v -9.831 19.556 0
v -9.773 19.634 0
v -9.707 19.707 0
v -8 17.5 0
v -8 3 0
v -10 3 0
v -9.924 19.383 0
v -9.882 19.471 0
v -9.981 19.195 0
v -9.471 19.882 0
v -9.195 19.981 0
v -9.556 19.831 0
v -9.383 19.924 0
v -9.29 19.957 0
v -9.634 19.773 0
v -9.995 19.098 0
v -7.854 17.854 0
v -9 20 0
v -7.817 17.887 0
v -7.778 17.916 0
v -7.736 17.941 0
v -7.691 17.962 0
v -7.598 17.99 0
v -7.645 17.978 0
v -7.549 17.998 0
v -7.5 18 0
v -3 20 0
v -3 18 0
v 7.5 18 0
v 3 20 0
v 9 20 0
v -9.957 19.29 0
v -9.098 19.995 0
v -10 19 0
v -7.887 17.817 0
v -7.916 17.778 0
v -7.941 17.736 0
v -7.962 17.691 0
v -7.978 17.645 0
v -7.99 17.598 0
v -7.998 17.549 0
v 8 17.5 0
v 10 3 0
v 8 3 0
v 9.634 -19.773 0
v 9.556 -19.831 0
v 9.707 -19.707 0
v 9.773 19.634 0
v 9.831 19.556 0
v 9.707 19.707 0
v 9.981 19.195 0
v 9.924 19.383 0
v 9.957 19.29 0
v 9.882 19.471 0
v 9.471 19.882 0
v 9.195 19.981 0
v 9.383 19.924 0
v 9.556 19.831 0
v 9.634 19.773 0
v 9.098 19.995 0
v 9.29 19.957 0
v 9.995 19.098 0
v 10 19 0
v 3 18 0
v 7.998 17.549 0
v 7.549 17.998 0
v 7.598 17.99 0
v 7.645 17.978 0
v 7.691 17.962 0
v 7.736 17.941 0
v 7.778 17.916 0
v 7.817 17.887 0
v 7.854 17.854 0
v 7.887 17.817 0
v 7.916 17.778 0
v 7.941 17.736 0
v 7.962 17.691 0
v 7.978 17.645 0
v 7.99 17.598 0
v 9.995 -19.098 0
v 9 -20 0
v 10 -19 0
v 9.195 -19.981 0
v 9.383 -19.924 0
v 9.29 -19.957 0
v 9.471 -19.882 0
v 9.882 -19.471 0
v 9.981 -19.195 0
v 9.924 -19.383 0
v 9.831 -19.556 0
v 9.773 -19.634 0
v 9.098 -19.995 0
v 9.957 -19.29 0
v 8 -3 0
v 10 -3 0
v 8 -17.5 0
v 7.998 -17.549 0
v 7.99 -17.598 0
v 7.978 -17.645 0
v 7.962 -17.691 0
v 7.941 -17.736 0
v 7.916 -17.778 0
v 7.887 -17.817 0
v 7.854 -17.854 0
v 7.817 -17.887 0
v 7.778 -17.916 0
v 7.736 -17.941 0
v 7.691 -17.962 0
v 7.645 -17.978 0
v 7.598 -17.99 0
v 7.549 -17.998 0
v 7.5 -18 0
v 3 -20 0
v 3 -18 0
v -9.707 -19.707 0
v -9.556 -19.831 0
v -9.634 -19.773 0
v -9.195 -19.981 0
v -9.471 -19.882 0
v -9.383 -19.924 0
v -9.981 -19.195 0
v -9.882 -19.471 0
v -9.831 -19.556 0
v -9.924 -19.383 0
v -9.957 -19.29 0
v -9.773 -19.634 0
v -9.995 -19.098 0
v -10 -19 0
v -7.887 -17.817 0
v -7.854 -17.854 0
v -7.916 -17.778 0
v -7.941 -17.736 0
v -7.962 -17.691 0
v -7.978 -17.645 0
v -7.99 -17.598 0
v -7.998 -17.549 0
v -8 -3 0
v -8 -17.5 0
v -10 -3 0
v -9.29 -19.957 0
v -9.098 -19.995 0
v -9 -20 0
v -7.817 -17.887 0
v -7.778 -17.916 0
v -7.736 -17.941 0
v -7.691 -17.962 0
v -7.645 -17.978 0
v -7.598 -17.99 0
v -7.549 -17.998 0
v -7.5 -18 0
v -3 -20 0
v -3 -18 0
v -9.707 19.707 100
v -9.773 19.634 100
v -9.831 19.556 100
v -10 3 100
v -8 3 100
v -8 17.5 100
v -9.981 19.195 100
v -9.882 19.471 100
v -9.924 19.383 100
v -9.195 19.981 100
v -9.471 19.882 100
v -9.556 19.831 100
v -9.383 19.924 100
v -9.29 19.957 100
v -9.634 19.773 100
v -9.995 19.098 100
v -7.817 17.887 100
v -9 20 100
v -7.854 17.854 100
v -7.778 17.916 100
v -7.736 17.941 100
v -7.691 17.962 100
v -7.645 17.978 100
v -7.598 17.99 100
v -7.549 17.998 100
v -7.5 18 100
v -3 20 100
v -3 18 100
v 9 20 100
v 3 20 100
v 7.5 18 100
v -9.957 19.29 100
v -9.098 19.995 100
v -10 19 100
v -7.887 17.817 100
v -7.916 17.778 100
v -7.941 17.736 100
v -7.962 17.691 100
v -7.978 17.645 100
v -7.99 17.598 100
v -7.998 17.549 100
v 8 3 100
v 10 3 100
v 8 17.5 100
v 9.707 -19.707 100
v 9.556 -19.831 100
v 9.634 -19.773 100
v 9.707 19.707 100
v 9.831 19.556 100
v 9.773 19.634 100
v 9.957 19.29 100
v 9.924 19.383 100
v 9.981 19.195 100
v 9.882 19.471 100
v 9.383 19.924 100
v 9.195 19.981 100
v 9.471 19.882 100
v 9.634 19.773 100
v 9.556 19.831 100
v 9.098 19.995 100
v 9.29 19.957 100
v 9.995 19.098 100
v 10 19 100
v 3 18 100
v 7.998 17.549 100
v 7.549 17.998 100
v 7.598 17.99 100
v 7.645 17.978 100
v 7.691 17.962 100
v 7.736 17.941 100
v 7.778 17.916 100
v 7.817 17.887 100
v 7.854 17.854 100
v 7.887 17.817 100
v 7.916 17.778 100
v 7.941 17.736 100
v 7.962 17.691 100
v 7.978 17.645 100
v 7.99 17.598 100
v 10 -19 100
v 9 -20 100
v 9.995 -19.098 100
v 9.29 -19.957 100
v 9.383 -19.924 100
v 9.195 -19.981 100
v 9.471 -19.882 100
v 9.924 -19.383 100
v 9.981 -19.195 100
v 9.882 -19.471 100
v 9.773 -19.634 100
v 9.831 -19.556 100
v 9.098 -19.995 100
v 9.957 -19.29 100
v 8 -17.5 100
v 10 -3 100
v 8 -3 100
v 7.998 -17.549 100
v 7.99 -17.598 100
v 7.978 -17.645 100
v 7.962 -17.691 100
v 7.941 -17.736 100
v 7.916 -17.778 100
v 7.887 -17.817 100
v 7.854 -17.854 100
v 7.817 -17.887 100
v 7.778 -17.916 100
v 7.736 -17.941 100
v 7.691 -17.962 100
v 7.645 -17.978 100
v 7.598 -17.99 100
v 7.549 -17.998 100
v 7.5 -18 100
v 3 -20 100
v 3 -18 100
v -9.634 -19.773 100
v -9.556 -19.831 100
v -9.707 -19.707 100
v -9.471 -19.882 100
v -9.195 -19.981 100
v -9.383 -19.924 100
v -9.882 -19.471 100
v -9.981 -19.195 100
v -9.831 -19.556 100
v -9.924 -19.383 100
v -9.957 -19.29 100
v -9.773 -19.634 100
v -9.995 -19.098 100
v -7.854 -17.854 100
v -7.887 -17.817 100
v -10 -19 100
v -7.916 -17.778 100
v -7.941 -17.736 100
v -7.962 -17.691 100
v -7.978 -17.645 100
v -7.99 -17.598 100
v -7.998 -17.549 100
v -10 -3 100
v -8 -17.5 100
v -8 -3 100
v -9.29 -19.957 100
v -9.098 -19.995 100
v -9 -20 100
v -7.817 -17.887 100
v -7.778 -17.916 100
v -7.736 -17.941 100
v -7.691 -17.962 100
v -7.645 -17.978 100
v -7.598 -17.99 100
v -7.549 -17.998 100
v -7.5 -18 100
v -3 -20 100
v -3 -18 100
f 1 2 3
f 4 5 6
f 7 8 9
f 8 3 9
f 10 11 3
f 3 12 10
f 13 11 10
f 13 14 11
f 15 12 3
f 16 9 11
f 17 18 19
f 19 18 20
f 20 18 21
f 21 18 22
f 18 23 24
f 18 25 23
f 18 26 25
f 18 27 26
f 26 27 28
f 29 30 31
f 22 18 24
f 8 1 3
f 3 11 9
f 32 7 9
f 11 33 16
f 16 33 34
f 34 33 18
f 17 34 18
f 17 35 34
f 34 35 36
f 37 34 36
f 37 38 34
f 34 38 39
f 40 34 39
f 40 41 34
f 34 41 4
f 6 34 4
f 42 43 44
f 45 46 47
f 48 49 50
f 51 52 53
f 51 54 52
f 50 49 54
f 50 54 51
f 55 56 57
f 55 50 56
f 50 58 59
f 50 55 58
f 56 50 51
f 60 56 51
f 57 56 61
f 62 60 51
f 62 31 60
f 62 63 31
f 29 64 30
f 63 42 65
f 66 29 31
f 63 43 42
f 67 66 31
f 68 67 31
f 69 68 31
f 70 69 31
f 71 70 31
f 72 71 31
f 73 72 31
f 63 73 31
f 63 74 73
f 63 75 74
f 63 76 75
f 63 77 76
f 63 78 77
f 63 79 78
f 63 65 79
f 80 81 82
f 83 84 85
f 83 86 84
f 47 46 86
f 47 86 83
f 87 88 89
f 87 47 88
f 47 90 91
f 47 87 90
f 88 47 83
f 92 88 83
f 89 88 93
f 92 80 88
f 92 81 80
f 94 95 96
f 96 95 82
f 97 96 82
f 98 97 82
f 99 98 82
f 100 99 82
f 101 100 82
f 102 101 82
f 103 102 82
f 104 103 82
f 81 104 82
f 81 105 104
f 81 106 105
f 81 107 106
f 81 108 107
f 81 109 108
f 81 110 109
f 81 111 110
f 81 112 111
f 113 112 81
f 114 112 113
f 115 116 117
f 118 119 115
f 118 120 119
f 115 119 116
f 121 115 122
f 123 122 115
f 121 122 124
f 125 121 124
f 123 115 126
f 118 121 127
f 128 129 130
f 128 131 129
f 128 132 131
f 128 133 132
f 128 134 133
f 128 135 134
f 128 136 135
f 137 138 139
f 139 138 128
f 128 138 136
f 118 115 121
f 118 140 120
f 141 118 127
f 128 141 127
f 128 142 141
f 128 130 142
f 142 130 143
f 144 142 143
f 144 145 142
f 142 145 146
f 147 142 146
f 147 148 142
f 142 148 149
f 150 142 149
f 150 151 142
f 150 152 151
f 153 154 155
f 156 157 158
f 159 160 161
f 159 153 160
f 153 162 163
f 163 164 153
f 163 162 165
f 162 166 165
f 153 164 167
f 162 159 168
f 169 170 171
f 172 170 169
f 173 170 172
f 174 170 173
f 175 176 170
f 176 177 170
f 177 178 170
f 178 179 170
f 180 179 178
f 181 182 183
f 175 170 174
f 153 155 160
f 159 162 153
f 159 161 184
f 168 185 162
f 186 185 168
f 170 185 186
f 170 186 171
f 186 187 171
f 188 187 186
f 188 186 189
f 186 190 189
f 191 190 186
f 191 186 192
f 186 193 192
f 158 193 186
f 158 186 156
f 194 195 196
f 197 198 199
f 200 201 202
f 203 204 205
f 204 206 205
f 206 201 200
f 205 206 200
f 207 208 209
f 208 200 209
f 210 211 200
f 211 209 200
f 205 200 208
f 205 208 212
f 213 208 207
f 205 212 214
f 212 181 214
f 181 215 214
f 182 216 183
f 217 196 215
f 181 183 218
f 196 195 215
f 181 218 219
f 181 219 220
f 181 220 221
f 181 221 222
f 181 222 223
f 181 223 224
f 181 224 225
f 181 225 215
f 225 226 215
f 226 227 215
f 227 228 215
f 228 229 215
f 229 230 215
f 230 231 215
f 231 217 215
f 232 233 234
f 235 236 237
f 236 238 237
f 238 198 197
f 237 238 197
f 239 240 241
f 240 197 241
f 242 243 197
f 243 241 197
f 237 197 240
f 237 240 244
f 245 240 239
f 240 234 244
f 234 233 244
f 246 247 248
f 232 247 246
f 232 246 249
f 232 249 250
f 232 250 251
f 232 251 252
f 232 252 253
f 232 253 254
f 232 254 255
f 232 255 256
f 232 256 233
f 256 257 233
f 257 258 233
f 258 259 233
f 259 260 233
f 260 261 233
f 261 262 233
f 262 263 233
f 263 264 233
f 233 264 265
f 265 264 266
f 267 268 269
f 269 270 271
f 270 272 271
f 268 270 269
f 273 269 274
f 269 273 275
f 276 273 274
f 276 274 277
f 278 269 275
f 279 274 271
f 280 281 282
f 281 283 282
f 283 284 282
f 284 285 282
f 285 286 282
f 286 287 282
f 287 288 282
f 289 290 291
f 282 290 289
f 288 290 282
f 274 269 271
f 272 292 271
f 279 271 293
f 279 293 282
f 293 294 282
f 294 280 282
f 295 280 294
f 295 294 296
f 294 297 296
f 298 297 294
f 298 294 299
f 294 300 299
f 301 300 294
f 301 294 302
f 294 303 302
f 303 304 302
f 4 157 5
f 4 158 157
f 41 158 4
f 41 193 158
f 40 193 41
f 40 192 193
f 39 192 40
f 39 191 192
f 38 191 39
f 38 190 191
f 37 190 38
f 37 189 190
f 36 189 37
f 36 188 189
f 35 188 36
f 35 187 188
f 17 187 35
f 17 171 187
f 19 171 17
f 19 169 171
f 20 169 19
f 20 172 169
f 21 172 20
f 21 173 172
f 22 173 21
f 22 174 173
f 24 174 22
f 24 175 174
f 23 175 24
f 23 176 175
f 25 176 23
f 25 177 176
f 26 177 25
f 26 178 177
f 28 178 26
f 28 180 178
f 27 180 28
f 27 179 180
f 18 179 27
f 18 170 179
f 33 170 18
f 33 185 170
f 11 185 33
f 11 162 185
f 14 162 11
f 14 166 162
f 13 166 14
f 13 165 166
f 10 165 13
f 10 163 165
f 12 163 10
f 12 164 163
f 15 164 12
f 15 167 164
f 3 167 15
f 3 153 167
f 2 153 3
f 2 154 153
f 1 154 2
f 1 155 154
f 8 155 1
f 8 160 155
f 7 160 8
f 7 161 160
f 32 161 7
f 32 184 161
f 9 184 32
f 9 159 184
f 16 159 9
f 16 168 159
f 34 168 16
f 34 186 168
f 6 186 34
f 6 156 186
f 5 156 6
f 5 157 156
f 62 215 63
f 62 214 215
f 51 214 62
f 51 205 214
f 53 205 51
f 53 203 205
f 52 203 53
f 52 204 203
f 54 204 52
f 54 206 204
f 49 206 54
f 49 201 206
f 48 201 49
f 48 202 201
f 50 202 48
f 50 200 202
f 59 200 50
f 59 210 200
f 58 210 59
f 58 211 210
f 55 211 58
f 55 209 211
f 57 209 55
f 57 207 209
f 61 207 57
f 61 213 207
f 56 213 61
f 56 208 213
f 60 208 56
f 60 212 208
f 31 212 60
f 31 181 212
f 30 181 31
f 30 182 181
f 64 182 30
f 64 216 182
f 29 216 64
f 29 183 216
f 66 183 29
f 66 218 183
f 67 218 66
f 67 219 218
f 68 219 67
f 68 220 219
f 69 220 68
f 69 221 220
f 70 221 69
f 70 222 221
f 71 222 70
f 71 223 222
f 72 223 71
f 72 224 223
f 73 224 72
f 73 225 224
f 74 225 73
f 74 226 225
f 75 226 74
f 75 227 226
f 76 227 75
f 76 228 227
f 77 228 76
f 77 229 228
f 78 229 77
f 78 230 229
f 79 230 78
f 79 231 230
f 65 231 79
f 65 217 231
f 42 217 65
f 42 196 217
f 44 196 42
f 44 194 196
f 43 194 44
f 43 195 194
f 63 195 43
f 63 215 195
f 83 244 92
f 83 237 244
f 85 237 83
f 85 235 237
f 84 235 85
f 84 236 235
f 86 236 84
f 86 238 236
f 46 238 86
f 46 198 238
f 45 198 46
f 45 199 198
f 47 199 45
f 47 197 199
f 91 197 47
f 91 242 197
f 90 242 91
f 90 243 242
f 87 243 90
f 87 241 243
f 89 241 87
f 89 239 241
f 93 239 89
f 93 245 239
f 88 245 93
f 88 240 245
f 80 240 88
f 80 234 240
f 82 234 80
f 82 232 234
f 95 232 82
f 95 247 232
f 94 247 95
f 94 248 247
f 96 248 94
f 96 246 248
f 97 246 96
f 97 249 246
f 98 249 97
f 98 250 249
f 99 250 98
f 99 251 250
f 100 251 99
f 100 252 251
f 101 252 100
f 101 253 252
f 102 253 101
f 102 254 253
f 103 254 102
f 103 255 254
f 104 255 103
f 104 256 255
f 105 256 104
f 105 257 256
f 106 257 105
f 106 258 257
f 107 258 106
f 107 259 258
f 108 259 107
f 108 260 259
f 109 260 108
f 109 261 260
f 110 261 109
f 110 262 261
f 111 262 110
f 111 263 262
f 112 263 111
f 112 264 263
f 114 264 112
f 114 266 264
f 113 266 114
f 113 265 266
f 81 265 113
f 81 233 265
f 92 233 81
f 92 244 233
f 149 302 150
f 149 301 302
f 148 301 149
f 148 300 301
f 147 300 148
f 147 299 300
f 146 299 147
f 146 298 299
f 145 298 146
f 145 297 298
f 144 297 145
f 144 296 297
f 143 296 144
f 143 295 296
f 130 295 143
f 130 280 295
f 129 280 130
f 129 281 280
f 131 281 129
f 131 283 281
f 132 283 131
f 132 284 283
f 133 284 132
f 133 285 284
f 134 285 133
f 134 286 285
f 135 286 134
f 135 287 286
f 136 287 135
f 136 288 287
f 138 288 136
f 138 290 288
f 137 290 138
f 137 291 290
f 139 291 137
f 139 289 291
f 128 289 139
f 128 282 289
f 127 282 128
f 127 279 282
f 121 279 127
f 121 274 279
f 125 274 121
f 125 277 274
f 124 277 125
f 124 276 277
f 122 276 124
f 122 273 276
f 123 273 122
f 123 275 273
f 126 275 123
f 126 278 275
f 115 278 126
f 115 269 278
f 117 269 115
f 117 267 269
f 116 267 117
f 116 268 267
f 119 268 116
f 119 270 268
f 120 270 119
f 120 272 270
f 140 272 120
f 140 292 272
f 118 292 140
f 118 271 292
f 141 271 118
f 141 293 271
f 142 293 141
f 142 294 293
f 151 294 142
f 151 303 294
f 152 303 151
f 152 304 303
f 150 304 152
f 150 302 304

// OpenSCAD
$fn = 64;

// 20x40 aluminum extrusion-like profile (simplified), 100mm long
// Cross-section: 20mm x 40mm with central bore and four T-slots (approximate)

length = 100;

w = 20;
h = 40;

// Outer corner radius (approx)
r_outer = 1.0;

// Wall thickness (approx)
wall = 2.0;

// Central bore (approx)
bore_d = 5.2;

// Slot parameters (approx)
slot_open = 6.0;     // opening at the face
slot_neck = 3.2;     // narrow neck
slot_depth = 6.5;    // depth from face inward
slot_head_w = 10.0;  // wider internal cavity
slot_head_d = 3.0;   // additional depth for head cavity

module rounded_rect_2d(w, h, r) {
    r2 = min(r, min(w, h)/2);
    hull() {
        translate([ w/2 - r2,  h/2 - r2]) circle(r2);
        translate([-w/2 + r2,  h/2 - r2]) circle(r2);
        translate([-w/2 + r2, -h/2 + r2]) circle(r2);
        translate([ w/2 - r2, -h/2 + r2]) circle(r2);
    }
}

module tslot_cut_2d(face_w, face_h, along_x=true) {
    // Creates a T-slot cut from a face inward.
    // along_x=true means slot opens on +/-X faces; otherwise on +/-Y faces.
    // The slot is centered on the face.
    // Constructed as union of a tapered neck and a wider head cavity.
    if (along_x) {
        // Slot opens on +X face; caller can mirror for -X
        translate([face_w/2 - slot_depth/2, 0])
            square([slot_depth, slot_open], center=true);

        // Neck (narrower) slightly deeper
        translate([face_w/2 - (slot_depth + slot_head_d)/2, 0])
            square([slot_depth + slot_head_d, slot_neck], center=true);

        // Head cavity (wider) deeper inside
        translate([face_w/2 - (slot_depth + slot_head_d) + slot_head_d/2 - 0.01, 0])
            square([slot_head_d + 0.02, slot_head_w], center=true);
    } else {
        // Slot opens on +Y face; caller can mirror for -Y
        translate([0, face_h/2 - slot_depth/2])
            square([slot_open, slot_depth], center=true);

        translate([0, face_h/2 - (slot_depth + slot_head_d)/2])
            square([slot_neck, slot_depth + slot_head_d], center=true);

        translate([0, face_h/2 - (slot_depth + slot_head_d) + slot_head_d/2 - 0.01])
            square([slot_head_w, slot_head_d + 0.02], center=true);
    }
}

module profile_20x40_2d() {
    difference() {
        // Outer shape
        rounded_rect_2d(w, h, r_outer);

        // Inner hollow (approx)
        rounded_rect_2d(w - 2*wall, h - 2*wall, max(0, r_outer - 0.5));

        // Central bore
        circle(d=bore_d);

        // T-slots on all four faces (approx)
        // +X and -X
        tslot_cut_2d(w, h, along_x=true);
        mirror([1,0,0]) tslot_cut_2d(w, h, along_x=true);

        // +Y and -Y
        tslot_cut_2d(w, h, along_x=false);
        mirror([0,1,0]) tslot_cut_2d(w, h, along_x=false);
    }
}

linear_extrude(height=length, center=false, convexity=10)
    profile_20x40_2d();
